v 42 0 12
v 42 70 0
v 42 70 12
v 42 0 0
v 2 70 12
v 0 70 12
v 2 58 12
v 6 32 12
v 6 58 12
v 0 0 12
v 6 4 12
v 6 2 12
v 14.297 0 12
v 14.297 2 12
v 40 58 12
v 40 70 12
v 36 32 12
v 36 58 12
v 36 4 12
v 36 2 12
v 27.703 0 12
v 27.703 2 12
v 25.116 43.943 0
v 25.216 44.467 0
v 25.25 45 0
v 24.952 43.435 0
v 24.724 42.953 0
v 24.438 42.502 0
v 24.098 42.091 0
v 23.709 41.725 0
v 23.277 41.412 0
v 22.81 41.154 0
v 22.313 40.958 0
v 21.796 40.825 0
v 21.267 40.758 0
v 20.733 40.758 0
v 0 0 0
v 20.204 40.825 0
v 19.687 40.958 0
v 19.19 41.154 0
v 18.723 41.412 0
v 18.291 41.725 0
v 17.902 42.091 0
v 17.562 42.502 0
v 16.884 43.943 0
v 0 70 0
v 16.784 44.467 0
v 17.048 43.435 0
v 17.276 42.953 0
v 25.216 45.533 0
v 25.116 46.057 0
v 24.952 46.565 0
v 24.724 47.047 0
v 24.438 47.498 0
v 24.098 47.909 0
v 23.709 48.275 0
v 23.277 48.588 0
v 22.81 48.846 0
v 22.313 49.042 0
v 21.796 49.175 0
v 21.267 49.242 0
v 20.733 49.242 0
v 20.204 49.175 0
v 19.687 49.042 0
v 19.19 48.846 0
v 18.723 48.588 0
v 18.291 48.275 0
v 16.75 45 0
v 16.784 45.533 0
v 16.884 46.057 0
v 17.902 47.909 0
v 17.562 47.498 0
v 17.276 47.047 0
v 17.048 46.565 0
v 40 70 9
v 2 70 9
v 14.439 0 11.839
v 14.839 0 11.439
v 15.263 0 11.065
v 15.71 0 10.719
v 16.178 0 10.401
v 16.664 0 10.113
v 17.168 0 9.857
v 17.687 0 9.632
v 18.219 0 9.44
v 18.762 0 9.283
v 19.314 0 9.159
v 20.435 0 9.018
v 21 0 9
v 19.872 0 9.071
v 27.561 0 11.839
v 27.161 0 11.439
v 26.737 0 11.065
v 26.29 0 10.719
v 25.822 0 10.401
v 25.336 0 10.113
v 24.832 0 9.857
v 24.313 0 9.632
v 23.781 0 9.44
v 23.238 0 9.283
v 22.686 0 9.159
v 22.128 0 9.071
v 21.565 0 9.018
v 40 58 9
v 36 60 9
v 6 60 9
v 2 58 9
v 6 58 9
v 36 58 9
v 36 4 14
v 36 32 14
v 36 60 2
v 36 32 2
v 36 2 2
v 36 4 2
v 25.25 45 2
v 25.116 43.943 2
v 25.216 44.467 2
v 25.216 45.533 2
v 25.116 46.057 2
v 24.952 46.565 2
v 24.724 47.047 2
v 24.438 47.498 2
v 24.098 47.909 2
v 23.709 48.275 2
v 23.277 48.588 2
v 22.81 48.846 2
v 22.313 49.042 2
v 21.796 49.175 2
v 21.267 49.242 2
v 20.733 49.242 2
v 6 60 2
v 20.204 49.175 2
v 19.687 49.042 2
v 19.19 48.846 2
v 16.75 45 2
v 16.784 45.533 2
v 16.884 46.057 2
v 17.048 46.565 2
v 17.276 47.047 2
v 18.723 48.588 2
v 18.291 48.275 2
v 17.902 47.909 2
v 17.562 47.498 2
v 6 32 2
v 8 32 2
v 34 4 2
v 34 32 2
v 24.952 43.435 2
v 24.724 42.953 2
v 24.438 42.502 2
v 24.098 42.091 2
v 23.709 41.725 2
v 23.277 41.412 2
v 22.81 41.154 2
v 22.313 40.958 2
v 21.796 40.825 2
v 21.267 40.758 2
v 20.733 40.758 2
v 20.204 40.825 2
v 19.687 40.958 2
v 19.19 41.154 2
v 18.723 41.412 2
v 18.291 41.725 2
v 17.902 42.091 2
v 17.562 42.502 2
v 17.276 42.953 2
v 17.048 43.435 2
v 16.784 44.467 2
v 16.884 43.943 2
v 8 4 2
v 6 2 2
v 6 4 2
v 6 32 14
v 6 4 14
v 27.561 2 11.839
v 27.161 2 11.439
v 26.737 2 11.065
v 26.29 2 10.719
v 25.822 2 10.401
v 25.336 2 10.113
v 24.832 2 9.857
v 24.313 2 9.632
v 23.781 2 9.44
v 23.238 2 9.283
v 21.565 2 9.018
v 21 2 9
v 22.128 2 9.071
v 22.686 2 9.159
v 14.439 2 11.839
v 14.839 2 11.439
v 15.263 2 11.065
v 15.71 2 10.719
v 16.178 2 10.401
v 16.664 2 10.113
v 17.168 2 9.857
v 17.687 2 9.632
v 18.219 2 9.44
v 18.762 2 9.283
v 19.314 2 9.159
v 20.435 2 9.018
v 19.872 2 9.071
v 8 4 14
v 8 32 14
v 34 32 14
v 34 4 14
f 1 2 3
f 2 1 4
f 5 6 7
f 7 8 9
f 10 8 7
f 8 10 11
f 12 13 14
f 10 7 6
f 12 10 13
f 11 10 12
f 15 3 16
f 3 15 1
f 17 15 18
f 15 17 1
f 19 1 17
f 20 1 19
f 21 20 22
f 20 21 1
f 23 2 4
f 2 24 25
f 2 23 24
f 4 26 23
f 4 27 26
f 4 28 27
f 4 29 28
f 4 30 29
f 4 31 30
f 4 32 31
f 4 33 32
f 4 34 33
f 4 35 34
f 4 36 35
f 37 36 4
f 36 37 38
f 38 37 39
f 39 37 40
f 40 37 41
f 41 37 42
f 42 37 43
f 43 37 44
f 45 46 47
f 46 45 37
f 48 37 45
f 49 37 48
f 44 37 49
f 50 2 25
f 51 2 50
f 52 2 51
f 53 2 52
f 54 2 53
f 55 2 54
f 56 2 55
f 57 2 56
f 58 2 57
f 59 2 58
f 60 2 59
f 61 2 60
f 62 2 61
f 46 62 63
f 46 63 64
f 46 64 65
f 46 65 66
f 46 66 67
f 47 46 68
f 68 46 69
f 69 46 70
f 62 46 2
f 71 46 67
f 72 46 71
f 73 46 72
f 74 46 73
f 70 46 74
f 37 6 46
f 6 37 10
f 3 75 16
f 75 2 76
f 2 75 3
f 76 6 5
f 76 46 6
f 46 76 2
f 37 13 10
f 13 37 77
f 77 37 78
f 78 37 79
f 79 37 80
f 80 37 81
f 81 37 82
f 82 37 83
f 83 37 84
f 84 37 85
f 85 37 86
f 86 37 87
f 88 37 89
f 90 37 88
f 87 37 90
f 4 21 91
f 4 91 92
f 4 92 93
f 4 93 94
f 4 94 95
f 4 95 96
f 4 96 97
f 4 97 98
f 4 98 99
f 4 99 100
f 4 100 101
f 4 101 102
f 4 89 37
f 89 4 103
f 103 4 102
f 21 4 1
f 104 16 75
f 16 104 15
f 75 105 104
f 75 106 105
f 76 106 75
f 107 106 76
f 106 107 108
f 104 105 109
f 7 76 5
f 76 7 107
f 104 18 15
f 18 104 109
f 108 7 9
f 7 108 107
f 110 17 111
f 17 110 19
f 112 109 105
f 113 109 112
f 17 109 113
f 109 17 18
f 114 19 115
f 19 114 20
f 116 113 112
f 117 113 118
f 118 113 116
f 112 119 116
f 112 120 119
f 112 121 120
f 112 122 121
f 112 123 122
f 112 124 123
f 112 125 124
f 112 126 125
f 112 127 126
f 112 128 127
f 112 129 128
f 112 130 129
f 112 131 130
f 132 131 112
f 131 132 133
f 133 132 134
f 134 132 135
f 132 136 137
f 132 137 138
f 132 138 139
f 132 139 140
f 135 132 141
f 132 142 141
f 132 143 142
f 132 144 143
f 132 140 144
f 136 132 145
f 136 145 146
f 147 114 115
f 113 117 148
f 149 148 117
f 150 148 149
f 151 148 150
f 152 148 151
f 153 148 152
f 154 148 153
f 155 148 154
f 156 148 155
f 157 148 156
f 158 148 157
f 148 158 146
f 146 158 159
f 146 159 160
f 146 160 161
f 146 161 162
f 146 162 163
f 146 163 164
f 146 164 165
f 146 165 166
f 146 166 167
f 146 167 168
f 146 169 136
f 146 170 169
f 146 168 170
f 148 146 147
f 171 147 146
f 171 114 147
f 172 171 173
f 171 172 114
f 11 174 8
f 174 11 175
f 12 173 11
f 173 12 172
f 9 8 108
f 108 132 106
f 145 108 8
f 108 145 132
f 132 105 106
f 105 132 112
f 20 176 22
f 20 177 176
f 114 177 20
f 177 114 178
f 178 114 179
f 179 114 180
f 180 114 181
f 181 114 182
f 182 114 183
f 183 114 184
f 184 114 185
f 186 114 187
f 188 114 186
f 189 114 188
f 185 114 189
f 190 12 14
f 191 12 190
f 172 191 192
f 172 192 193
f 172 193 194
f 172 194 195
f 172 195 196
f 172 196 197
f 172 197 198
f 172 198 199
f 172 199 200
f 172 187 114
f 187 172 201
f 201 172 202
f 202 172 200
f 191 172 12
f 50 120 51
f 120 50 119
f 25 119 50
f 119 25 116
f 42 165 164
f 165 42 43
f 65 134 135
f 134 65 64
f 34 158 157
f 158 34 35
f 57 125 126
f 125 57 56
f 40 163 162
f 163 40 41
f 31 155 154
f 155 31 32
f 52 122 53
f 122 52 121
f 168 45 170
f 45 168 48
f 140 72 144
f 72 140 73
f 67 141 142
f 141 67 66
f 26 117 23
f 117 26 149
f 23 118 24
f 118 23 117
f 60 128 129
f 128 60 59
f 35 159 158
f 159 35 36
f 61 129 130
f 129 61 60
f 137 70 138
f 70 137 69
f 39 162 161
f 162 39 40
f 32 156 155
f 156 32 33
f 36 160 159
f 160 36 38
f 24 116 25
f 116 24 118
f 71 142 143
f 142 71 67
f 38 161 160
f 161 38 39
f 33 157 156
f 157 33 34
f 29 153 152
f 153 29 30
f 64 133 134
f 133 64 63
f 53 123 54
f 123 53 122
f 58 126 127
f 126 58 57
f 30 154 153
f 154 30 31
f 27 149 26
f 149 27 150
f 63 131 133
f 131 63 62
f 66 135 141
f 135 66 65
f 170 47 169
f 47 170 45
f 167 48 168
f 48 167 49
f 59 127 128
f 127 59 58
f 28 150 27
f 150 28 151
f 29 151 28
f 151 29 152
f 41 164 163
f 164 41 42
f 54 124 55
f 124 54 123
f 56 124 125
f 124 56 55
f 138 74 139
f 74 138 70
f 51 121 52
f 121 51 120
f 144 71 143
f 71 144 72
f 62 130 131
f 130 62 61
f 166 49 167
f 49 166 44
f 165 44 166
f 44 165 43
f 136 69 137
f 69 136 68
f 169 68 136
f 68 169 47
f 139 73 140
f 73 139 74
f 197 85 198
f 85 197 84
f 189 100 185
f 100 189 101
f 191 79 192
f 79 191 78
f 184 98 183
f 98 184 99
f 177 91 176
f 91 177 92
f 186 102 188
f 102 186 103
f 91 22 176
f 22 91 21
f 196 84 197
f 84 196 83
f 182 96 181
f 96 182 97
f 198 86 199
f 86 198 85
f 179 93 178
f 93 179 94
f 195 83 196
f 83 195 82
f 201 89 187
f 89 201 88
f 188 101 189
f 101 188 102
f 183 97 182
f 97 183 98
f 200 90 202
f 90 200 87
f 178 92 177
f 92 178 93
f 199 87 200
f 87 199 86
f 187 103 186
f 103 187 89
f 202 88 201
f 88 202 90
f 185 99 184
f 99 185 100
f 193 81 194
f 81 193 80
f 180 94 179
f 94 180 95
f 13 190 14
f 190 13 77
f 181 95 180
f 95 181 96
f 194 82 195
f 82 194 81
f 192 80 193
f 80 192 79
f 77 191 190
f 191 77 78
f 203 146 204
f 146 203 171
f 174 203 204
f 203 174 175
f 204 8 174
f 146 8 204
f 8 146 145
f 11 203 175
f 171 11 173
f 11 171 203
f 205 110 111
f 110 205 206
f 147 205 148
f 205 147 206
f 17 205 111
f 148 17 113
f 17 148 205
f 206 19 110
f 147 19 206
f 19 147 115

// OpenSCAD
/**

Terminal covers for Victron Lynx Power In

@idnorton

Licenced as Creative Commons Attribution Non Commercial 3.0
See https://creativecommons.org/licenses/by-nc/3.0/

Specifically you may not sell the design or products using the design.
You're welcome to use the design to build things for your own use :)

Perimiters: 6
Seam position: Random
Infill: 30%

**/

busbar_x = 30;
busbar_y = 25;
busbar_z = 8;

bolt = 8.5;

cable_entry = 18;
case_base = 8;

case_thickness = 2;
case_x_thickness = 6;

case_x = busbar_x + (2 * case_x_thickness);
case_y = 70;
case_z = 12;

insulator_x = 38;
insulator_y = 12;
insulator_z = 17;

insulator_groove_x = 34;
insulator_groove_y = 3;
insulator_groove_z = 12;
insulator_groove_inset = 2;


difference() {
    // Main external body
    cube([busbar_x + (2 * case_x_thickness), case_y, case_z]);

    // Terminal insulator next to body
    translate([case_thickness, case_y - insulator_y, case_z - 3]) {
        cube([insulator_x, insulator_y, insulator_z]);
    }

    // Main body opening for busbar
    translate([case_x_thickness, case_thickness, case_thickness]) {
        cube([busbar_x, case_y - insulator_y, busbar_z*2]);
    }

    // Through bolt hole for securing
    translate([case_x/2, case_y - 25, 0]) {
        cylinder(h = case_z * 6, d = bolt, center = true, $fn=50);
    }

    // Cable entry (only a little bit to match the one in the bottom half
    translate([case_x/2, 0, case_z + 6]) {
        rotate([90, 0, 0]) {
           cylinder(h = 10, d = cable_entry, center = true, $fn=100);
        }
    }
}

// Tab to lock to base
translate([case_x_thickness, case_thickness * 2, 0]) {
    cube([2, 28, case_z + case_thickness]);
}

// Tab to lock to base
translate([case_x - (case_x_thickness + 2), case_thickness * 2, 0]) {
    cube([2, 28, case_z + case_thickness]);
}
